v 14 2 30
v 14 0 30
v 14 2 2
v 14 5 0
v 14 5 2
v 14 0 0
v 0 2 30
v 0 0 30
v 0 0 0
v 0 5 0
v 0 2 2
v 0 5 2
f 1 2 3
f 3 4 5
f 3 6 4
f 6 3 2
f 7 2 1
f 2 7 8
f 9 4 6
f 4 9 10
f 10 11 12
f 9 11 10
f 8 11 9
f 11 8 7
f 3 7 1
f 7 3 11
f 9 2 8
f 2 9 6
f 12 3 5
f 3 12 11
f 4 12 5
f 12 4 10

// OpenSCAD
union(){
cube([14,2,30]);

color([1,0,0]);
translate([14,0,0]){
cube([14,5,0]);
}

translate([0,2,0]){
color(["red"]) cube([14,3,2]);
}

}
